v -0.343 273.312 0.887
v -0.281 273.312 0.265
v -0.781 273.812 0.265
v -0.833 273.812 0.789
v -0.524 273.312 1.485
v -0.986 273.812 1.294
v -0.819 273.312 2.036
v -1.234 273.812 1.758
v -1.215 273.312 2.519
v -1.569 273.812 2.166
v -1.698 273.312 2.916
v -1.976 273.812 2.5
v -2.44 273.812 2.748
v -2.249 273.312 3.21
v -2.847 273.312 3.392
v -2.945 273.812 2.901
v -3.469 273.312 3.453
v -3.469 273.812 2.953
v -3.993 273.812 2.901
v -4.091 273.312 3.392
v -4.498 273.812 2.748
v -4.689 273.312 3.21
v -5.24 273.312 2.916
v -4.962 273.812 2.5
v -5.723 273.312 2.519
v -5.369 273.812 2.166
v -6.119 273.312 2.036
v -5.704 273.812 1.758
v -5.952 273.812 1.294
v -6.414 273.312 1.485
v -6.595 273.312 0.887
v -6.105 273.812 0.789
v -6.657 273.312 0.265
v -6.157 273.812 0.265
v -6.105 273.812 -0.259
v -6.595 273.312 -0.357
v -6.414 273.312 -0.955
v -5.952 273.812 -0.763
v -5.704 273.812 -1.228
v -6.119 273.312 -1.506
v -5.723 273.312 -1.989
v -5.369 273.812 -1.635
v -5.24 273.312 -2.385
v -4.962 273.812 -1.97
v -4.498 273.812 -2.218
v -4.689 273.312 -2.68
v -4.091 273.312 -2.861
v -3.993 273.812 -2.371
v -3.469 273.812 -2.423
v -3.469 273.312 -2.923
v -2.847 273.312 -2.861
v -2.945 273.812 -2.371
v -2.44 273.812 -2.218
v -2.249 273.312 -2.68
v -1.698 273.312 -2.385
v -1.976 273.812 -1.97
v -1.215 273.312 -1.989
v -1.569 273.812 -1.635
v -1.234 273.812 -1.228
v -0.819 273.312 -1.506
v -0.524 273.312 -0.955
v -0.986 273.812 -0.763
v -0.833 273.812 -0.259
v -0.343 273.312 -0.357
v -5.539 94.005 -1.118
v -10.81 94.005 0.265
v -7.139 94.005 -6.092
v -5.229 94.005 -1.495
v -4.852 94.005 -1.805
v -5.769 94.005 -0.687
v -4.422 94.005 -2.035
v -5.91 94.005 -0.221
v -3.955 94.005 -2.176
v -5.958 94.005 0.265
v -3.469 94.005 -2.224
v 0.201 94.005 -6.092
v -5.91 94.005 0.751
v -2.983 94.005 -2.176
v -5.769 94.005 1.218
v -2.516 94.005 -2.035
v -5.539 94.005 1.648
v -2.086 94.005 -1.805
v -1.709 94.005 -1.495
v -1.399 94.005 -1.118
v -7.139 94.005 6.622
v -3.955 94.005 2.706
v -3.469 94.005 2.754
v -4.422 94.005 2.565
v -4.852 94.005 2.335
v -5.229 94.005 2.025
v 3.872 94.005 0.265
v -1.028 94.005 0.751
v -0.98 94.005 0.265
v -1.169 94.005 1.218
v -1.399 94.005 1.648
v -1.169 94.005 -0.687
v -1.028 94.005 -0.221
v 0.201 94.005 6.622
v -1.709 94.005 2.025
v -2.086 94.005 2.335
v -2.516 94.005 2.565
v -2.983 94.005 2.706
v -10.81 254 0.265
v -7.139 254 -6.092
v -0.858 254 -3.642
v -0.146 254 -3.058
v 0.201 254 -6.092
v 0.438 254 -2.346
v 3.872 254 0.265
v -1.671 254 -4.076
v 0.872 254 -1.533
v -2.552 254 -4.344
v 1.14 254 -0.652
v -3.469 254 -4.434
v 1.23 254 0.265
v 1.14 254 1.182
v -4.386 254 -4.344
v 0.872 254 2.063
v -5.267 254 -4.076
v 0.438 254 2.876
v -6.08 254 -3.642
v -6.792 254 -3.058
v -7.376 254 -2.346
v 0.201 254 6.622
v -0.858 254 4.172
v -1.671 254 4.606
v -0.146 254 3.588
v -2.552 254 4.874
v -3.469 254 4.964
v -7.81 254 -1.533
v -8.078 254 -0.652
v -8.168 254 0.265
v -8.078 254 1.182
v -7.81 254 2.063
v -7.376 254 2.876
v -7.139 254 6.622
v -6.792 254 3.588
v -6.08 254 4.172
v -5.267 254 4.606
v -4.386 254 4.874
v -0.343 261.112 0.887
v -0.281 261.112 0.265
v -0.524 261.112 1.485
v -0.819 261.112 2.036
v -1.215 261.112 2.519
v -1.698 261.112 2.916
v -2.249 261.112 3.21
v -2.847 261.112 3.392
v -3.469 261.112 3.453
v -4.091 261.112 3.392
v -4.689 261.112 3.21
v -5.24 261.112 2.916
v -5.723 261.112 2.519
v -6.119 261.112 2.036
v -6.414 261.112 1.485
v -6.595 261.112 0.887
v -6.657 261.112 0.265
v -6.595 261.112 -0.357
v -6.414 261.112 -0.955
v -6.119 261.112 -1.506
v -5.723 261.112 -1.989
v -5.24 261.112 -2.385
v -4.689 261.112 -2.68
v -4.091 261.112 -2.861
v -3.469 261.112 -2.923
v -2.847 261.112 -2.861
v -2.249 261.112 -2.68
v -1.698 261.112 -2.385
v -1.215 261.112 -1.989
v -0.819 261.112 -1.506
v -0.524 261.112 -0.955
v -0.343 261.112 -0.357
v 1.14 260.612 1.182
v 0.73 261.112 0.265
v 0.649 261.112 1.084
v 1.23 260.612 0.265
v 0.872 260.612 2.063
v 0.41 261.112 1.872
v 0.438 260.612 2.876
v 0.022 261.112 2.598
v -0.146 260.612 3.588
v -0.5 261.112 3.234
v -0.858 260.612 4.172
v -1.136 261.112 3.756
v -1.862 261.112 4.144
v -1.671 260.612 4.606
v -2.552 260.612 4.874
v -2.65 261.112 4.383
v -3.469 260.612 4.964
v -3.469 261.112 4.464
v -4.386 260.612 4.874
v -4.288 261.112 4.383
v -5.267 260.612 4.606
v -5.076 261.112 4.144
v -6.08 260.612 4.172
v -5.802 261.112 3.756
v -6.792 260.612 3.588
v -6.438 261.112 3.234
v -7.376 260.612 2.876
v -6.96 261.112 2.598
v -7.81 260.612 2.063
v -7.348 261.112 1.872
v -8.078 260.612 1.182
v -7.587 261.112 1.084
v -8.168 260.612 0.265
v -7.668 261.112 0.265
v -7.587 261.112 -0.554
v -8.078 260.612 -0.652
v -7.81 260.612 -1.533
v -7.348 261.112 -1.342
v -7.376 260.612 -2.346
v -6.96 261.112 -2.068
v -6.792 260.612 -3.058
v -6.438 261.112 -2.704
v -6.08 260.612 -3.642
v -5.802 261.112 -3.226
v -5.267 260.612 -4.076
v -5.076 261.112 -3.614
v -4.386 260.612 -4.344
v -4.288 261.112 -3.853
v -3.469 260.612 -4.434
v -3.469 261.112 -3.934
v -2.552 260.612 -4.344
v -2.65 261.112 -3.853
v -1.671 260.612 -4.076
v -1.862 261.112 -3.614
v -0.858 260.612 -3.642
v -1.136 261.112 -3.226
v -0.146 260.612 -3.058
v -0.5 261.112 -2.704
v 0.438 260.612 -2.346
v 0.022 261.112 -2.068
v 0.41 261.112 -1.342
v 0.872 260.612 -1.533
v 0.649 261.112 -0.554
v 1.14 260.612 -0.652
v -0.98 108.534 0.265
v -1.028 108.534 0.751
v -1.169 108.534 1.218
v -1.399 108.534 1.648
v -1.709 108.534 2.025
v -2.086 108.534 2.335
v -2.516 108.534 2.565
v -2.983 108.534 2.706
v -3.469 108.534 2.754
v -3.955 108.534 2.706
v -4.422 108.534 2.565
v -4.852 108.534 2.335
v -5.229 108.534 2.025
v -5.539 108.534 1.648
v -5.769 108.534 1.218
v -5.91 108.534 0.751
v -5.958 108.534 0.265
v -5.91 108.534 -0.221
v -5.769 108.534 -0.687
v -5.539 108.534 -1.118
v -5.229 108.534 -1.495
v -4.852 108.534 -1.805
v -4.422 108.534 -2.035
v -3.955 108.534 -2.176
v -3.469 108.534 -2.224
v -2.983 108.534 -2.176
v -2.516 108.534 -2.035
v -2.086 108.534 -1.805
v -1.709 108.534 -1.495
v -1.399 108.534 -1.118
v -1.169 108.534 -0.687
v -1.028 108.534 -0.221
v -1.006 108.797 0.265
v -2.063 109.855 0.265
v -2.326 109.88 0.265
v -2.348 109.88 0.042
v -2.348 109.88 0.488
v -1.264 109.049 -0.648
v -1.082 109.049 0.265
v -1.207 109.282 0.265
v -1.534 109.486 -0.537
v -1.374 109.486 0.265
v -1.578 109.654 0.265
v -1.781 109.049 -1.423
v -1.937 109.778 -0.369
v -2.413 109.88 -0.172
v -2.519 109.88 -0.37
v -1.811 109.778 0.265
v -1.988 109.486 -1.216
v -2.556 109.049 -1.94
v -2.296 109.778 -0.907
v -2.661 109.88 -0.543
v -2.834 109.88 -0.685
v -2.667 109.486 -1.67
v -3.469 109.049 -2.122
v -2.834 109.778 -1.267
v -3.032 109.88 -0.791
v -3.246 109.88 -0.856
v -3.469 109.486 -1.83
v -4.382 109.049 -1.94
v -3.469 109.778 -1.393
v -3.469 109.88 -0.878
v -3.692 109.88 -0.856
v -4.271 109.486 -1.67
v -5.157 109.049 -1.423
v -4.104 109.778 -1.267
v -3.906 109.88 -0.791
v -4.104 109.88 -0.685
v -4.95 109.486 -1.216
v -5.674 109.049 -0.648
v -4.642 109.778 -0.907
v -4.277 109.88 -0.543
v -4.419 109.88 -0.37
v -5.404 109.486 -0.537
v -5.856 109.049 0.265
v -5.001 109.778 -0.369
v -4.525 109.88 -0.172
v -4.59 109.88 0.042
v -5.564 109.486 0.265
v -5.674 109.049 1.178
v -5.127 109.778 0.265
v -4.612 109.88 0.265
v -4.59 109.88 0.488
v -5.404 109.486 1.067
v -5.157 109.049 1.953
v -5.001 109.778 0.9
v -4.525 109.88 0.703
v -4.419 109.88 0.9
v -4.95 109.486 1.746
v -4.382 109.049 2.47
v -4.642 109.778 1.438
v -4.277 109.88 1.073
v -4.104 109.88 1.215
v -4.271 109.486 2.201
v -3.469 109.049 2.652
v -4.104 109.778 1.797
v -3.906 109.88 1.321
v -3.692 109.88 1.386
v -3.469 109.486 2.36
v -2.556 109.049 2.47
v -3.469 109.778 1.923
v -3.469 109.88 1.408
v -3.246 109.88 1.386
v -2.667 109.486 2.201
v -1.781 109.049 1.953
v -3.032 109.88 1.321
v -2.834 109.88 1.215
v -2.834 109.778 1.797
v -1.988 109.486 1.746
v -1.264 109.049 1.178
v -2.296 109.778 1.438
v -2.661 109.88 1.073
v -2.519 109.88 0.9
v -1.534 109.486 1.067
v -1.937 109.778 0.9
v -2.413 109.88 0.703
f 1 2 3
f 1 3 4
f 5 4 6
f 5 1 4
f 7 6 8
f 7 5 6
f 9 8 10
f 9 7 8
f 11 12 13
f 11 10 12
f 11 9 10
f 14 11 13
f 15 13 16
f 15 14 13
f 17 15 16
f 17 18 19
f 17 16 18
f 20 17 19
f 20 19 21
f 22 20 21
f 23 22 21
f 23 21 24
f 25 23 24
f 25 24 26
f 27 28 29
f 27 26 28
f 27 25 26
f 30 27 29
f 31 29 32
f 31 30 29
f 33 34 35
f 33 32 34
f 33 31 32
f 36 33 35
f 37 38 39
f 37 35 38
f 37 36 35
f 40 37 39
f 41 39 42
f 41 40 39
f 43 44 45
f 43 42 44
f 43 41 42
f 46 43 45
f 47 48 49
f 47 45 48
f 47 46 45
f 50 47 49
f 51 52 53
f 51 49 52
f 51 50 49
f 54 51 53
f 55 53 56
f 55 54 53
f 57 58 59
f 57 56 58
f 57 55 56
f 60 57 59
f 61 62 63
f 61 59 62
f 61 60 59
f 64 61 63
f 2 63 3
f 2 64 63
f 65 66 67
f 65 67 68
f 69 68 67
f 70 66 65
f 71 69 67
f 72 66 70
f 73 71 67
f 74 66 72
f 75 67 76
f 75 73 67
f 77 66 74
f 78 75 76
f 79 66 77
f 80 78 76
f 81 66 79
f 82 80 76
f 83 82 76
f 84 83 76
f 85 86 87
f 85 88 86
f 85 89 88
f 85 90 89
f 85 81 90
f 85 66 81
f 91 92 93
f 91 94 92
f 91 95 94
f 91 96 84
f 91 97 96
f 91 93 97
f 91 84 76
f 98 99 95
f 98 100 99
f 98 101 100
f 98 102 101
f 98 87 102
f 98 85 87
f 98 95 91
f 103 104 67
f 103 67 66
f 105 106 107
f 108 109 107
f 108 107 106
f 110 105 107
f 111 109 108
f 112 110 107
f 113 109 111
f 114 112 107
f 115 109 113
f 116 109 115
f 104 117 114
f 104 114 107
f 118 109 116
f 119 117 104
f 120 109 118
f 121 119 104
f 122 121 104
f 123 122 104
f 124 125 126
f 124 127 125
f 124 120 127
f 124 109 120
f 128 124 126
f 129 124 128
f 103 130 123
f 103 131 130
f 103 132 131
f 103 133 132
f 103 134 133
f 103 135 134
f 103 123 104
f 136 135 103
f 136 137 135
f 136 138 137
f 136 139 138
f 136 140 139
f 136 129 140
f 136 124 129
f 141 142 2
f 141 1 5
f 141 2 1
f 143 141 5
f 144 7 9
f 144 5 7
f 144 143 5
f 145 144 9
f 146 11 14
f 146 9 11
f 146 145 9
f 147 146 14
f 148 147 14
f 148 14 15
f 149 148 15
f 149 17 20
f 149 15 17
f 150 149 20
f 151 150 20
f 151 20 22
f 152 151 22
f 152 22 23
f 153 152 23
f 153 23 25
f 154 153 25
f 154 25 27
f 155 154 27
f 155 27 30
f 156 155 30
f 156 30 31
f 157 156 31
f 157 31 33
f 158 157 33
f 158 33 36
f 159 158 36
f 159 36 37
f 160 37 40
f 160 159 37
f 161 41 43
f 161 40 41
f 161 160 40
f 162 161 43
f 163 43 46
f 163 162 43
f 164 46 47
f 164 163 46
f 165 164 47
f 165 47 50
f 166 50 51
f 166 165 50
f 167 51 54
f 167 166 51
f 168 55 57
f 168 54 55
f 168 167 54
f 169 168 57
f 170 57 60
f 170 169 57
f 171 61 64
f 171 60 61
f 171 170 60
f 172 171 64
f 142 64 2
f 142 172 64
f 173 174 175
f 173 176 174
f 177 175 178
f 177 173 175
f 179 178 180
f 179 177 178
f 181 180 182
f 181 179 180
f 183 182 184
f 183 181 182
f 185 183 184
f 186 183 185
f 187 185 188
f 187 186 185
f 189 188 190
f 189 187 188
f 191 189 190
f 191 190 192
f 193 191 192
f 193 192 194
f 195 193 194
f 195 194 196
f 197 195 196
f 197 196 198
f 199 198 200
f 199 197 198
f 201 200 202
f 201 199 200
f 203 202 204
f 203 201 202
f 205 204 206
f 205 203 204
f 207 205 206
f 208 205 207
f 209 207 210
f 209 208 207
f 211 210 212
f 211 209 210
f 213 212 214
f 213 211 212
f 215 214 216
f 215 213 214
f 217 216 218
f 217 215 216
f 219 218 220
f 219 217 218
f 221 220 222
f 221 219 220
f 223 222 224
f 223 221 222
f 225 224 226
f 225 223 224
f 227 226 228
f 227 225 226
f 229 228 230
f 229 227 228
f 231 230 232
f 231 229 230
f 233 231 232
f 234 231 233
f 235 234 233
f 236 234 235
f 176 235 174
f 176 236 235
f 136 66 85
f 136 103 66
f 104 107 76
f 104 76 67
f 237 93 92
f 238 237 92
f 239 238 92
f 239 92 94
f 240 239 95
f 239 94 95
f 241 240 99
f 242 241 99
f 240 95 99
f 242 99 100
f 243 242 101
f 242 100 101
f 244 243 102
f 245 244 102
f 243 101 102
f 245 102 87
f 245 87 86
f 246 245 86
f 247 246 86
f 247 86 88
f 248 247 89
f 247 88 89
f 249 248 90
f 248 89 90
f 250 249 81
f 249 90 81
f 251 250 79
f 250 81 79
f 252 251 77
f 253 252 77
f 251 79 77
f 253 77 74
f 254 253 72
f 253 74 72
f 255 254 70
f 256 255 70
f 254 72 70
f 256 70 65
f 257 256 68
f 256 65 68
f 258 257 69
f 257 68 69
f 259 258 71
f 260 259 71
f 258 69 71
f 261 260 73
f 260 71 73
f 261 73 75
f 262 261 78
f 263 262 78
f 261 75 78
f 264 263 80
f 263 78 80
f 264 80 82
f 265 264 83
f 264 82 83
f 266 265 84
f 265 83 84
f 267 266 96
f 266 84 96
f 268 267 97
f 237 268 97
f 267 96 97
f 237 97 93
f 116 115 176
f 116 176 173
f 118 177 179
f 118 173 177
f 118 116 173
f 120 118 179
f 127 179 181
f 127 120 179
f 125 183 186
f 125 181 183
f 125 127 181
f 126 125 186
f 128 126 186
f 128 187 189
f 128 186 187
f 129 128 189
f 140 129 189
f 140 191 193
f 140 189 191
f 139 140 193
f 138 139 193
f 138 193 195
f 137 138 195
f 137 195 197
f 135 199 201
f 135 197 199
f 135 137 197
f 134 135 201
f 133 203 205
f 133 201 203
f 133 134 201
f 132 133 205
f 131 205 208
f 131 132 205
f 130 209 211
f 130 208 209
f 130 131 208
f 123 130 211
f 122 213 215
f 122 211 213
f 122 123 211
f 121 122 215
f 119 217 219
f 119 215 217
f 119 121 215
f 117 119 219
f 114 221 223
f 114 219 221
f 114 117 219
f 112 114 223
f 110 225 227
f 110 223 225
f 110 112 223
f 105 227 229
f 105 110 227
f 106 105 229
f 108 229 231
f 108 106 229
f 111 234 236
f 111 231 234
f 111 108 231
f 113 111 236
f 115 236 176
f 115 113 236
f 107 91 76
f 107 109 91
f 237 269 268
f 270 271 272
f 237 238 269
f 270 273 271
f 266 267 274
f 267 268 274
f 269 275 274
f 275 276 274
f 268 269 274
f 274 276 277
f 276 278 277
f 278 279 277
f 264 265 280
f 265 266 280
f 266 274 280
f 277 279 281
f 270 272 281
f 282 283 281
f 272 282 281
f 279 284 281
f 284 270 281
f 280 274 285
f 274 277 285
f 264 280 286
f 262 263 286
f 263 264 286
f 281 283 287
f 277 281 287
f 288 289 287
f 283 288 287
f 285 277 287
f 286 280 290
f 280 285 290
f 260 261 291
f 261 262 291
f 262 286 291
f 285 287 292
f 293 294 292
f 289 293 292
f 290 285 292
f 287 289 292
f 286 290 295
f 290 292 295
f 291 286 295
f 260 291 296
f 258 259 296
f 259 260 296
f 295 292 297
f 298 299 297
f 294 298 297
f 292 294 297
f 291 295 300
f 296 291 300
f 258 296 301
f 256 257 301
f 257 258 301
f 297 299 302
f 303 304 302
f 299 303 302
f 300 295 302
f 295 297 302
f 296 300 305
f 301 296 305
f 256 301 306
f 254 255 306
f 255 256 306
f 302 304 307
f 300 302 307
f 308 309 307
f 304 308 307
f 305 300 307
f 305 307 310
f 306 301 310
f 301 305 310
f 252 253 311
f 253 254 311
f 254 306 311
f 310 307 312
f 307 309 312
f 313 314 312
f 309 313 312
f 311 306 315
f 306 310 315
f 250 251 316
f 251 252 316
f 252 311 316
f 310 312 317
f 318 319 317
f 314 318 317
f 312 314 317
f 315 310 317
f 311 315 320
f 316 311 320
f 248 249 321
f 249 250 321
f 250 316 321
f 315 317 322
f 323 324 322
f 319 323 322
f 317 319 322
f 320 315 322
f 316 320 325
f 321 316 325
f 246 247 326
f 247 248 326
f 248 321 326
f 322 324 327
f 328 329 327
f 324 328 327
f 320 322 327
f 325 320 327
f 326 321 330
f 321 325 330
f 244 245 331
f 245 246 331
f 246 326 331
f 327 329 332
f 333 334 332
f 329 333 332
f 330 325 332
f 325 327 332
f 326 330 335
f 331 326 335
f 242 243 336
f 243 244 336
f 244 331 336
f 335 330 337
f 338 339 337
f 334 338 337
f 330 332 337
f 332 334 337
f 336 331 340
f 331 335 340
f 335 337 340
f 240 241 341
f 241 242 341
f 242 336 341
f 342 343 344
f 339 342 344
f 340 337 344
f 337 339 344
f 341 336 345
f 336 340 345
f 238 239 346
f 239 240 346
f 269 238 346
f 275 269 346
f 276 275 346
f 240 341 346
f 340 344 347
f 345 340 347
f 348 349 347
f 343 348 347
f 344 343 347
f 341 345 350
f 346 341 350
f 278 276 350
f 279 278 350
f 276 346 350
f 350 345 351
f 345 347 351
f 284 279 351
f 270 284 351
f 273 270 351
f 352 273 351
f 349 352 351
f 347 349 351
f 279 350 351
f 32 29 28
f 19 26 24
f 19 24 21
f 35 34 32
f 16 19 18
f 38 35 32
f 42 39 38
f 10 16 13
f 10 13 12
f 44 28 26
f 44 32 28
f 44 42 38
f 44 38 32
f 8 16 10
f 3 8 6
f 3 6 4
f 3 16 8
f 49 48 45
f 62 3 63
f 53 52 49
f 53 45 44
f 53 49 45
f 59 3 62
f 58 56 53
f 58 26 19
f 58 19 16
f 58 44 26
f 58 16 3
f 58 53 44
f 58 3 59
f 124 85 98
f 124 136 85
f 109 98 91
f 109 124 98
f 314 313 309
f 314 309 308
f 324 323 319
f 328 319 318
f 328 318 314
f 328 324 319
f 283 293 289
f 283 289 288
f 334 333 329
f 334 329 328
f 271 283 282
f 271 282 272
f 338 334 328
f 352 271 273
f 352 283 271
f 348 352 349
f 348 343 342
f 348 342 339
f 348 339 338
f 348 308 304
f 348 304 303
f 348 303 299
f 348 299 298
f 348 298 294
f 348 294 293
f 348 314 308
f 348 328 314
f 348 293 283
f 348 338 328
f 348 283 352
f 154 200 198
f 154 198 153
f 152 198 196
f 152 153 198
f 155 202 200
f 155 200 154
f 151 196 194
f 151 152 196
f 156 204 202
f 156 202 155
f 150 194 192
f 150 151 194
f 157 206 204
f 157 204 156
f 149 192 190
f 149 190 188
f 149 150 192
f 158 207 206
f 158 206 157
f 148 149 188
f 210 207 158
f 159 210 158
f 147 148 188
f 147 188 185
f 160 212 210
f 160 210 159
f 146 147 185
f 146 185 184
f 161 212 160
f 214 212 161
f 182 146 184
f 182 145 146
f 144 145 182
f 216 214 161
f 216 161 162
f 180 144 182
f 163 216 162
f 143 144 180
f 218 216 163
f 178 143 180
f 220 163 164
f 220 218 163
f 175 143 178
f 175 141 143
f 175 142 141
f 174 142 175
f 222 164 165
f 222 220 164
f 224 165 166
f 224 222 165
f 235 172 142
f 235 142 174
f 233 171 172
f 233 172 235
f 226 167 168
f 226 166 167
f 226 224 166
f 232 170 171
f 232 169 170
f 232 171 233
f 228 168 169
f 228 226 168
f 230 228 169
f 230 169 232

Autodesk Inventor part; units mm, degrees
ref_plane "YZ Plane" through (0, 0, 0) normal (1, 0, 0) x (0, 1, 0)
ref_plane "XZ Plane" through (0, 0, 0) normal (0, 1, 0) x (-1, 0, 0)
ref_plane "XY Plane" through (0, 0, 0) normal (0, 0, 1) x (1, 0, 0)
sketch "Sketch1" plane through (0, 0, 0) normal (0, 1, 0) x (-1, 0, 0)
  line L0 (7.1393, -6.0921) -> (-0.2013, -6.0921)
  line L1 (-0.2013, -6.0921) -> (-3.8716, 0.2651)
  line L2 (-3.8716, 0.2651) -> (-0.2013, 6.6222)
  line L3 (-0.2013, 6.6222) -> (7.1393, 6.6222)
  line L4 (7.1393, -6.0921) -> (10.8096, 0.2651)
  line L5 (10.8096, 0.2651) -> (7.1393, 6.6222)
  point P0 (0, 0)
  dimension "d0" = 7.3406
  dimension "d1" = 7.3406
  dimension "d2" = 7.3406
  dimension "d3" = 7.3406
  dimension "d4" = 120
  dimension "d5" = 120
  dimension "d6" = 120
  dimension "d7" = 7.3406
  dimension "d8" = 120
  dimension "d9" = 7.3406
extrude "Extrusion1" add sketch "Sketch1" along normal blind 254
sketch "Sketch3" plane through (0, 254, 0) normal (0, 1, 0) x (1, 0, 0)
  circle A0 centre (-3.469, -0.2651) radius 4.699
  point P0 (0, 0)
  dimension "d21" = 9.398
extrude "Extrusion2" add sketch "Sketch3" along normal blind 7.112
chamfer "Chamfer1" distance 0.5 angle 45 1 edges at (-8.168, 261.112, 0.2651)
sketch "Sketch4" plane through (-3.469, 261.112, 0.2651) normal (0, 1, 0) x (1, 0, 0)
  circle A0 centre (0, 0) radius 4.199 projected
  circle A1 centre (0, 0) radius 3.1877
  point P0 (3.469, 0.2651)
  dimension "d27" = 6.3754
extrude "Extrusion3" add sketch "Sketch4" along normal blind 12.7 contours A1
chamfer "Chamfer2" distance 0.5 angle 45 1 edges at (-6.6567, 273.812, 0.2651)
sketch "Sketch5" plane through (0, 0, 0) normal (0, -1, 0) x (1, 0, 0)
  line L0 (-7.1393, -6.0921) -> (0.2013, -6.0921) projected
  line L1 (0.2013, -6.0921) -> (3.8716, 0.2651) projected
  line L2 (3.8716, 0.2651) -> (0.2013, 6.6222) projected
  line L3 (0.2013, 6.6222) -> (-7.1393, 6.6222) projected
  line L4 (-7.1393, 6.6222) -> (-10.8096, 0.2651) projected
  line L5 (-10.8096, 0.2651) -> (-7.1393, -6.0921) projected
  point P0 (0, 0)
extrude "Extrusion4" cut sketch "Sketch5" against normal blind 101.346
sketch "Sketch6" plane through (0, 101.346, 0) normal (0, -1, 0) x (1, 0, 0)
  line L0 (0.2013, -6.0921) -> (-7.1393, -6.0921) projected
  line L1 (3.8716, 0.2651) -> (0.2013, -6.0921) projected
  line L2 (0.2013, 6.6222) -> (3.8716, 0.2651) projected
  line L3 (-7.1393, 6.6222) -> (0.2013, 6.6222) projected
  line L4 (-10.8096, 0.2651) -> (-7.1393, 6.6222) projected
  line L5 (-7.1393, -6.0921) -> (-10.8096, 0.2651) projected
  point P0 (0, 0)
extrude "Extrusion5" add sketch "Sketch6" along normal blind 7.3406
sketch "Sketch7" plane through (0, 94.0054, 0) normal (0, -1, 0) x (1, 0, 0)
  circle A0 centre (-3.469, 0.2651) radius 2.4892
  point P0 (0, 0)
  dimension "d37" = 4.9784
extrude "Extrusion6" cut sketch "Sketch7" against normal blind 15.875
sketch "Sketch8" plane through (-3.469, 109.8804, 0.2651) normal (0, -1, 0) x (1, 0, 0)
  circle A0 centre (0, 0) radius 2.4892 projected
  point P0 (3.469, -0.2651)
fillet "Fillet1" radius 1.3462 1 edges at (-5.9582, 109.8804, 0.2651)
equation "\"d5\" = d4"
equation "\"d8\" = d4"
properties part number "Hex Shaft"
